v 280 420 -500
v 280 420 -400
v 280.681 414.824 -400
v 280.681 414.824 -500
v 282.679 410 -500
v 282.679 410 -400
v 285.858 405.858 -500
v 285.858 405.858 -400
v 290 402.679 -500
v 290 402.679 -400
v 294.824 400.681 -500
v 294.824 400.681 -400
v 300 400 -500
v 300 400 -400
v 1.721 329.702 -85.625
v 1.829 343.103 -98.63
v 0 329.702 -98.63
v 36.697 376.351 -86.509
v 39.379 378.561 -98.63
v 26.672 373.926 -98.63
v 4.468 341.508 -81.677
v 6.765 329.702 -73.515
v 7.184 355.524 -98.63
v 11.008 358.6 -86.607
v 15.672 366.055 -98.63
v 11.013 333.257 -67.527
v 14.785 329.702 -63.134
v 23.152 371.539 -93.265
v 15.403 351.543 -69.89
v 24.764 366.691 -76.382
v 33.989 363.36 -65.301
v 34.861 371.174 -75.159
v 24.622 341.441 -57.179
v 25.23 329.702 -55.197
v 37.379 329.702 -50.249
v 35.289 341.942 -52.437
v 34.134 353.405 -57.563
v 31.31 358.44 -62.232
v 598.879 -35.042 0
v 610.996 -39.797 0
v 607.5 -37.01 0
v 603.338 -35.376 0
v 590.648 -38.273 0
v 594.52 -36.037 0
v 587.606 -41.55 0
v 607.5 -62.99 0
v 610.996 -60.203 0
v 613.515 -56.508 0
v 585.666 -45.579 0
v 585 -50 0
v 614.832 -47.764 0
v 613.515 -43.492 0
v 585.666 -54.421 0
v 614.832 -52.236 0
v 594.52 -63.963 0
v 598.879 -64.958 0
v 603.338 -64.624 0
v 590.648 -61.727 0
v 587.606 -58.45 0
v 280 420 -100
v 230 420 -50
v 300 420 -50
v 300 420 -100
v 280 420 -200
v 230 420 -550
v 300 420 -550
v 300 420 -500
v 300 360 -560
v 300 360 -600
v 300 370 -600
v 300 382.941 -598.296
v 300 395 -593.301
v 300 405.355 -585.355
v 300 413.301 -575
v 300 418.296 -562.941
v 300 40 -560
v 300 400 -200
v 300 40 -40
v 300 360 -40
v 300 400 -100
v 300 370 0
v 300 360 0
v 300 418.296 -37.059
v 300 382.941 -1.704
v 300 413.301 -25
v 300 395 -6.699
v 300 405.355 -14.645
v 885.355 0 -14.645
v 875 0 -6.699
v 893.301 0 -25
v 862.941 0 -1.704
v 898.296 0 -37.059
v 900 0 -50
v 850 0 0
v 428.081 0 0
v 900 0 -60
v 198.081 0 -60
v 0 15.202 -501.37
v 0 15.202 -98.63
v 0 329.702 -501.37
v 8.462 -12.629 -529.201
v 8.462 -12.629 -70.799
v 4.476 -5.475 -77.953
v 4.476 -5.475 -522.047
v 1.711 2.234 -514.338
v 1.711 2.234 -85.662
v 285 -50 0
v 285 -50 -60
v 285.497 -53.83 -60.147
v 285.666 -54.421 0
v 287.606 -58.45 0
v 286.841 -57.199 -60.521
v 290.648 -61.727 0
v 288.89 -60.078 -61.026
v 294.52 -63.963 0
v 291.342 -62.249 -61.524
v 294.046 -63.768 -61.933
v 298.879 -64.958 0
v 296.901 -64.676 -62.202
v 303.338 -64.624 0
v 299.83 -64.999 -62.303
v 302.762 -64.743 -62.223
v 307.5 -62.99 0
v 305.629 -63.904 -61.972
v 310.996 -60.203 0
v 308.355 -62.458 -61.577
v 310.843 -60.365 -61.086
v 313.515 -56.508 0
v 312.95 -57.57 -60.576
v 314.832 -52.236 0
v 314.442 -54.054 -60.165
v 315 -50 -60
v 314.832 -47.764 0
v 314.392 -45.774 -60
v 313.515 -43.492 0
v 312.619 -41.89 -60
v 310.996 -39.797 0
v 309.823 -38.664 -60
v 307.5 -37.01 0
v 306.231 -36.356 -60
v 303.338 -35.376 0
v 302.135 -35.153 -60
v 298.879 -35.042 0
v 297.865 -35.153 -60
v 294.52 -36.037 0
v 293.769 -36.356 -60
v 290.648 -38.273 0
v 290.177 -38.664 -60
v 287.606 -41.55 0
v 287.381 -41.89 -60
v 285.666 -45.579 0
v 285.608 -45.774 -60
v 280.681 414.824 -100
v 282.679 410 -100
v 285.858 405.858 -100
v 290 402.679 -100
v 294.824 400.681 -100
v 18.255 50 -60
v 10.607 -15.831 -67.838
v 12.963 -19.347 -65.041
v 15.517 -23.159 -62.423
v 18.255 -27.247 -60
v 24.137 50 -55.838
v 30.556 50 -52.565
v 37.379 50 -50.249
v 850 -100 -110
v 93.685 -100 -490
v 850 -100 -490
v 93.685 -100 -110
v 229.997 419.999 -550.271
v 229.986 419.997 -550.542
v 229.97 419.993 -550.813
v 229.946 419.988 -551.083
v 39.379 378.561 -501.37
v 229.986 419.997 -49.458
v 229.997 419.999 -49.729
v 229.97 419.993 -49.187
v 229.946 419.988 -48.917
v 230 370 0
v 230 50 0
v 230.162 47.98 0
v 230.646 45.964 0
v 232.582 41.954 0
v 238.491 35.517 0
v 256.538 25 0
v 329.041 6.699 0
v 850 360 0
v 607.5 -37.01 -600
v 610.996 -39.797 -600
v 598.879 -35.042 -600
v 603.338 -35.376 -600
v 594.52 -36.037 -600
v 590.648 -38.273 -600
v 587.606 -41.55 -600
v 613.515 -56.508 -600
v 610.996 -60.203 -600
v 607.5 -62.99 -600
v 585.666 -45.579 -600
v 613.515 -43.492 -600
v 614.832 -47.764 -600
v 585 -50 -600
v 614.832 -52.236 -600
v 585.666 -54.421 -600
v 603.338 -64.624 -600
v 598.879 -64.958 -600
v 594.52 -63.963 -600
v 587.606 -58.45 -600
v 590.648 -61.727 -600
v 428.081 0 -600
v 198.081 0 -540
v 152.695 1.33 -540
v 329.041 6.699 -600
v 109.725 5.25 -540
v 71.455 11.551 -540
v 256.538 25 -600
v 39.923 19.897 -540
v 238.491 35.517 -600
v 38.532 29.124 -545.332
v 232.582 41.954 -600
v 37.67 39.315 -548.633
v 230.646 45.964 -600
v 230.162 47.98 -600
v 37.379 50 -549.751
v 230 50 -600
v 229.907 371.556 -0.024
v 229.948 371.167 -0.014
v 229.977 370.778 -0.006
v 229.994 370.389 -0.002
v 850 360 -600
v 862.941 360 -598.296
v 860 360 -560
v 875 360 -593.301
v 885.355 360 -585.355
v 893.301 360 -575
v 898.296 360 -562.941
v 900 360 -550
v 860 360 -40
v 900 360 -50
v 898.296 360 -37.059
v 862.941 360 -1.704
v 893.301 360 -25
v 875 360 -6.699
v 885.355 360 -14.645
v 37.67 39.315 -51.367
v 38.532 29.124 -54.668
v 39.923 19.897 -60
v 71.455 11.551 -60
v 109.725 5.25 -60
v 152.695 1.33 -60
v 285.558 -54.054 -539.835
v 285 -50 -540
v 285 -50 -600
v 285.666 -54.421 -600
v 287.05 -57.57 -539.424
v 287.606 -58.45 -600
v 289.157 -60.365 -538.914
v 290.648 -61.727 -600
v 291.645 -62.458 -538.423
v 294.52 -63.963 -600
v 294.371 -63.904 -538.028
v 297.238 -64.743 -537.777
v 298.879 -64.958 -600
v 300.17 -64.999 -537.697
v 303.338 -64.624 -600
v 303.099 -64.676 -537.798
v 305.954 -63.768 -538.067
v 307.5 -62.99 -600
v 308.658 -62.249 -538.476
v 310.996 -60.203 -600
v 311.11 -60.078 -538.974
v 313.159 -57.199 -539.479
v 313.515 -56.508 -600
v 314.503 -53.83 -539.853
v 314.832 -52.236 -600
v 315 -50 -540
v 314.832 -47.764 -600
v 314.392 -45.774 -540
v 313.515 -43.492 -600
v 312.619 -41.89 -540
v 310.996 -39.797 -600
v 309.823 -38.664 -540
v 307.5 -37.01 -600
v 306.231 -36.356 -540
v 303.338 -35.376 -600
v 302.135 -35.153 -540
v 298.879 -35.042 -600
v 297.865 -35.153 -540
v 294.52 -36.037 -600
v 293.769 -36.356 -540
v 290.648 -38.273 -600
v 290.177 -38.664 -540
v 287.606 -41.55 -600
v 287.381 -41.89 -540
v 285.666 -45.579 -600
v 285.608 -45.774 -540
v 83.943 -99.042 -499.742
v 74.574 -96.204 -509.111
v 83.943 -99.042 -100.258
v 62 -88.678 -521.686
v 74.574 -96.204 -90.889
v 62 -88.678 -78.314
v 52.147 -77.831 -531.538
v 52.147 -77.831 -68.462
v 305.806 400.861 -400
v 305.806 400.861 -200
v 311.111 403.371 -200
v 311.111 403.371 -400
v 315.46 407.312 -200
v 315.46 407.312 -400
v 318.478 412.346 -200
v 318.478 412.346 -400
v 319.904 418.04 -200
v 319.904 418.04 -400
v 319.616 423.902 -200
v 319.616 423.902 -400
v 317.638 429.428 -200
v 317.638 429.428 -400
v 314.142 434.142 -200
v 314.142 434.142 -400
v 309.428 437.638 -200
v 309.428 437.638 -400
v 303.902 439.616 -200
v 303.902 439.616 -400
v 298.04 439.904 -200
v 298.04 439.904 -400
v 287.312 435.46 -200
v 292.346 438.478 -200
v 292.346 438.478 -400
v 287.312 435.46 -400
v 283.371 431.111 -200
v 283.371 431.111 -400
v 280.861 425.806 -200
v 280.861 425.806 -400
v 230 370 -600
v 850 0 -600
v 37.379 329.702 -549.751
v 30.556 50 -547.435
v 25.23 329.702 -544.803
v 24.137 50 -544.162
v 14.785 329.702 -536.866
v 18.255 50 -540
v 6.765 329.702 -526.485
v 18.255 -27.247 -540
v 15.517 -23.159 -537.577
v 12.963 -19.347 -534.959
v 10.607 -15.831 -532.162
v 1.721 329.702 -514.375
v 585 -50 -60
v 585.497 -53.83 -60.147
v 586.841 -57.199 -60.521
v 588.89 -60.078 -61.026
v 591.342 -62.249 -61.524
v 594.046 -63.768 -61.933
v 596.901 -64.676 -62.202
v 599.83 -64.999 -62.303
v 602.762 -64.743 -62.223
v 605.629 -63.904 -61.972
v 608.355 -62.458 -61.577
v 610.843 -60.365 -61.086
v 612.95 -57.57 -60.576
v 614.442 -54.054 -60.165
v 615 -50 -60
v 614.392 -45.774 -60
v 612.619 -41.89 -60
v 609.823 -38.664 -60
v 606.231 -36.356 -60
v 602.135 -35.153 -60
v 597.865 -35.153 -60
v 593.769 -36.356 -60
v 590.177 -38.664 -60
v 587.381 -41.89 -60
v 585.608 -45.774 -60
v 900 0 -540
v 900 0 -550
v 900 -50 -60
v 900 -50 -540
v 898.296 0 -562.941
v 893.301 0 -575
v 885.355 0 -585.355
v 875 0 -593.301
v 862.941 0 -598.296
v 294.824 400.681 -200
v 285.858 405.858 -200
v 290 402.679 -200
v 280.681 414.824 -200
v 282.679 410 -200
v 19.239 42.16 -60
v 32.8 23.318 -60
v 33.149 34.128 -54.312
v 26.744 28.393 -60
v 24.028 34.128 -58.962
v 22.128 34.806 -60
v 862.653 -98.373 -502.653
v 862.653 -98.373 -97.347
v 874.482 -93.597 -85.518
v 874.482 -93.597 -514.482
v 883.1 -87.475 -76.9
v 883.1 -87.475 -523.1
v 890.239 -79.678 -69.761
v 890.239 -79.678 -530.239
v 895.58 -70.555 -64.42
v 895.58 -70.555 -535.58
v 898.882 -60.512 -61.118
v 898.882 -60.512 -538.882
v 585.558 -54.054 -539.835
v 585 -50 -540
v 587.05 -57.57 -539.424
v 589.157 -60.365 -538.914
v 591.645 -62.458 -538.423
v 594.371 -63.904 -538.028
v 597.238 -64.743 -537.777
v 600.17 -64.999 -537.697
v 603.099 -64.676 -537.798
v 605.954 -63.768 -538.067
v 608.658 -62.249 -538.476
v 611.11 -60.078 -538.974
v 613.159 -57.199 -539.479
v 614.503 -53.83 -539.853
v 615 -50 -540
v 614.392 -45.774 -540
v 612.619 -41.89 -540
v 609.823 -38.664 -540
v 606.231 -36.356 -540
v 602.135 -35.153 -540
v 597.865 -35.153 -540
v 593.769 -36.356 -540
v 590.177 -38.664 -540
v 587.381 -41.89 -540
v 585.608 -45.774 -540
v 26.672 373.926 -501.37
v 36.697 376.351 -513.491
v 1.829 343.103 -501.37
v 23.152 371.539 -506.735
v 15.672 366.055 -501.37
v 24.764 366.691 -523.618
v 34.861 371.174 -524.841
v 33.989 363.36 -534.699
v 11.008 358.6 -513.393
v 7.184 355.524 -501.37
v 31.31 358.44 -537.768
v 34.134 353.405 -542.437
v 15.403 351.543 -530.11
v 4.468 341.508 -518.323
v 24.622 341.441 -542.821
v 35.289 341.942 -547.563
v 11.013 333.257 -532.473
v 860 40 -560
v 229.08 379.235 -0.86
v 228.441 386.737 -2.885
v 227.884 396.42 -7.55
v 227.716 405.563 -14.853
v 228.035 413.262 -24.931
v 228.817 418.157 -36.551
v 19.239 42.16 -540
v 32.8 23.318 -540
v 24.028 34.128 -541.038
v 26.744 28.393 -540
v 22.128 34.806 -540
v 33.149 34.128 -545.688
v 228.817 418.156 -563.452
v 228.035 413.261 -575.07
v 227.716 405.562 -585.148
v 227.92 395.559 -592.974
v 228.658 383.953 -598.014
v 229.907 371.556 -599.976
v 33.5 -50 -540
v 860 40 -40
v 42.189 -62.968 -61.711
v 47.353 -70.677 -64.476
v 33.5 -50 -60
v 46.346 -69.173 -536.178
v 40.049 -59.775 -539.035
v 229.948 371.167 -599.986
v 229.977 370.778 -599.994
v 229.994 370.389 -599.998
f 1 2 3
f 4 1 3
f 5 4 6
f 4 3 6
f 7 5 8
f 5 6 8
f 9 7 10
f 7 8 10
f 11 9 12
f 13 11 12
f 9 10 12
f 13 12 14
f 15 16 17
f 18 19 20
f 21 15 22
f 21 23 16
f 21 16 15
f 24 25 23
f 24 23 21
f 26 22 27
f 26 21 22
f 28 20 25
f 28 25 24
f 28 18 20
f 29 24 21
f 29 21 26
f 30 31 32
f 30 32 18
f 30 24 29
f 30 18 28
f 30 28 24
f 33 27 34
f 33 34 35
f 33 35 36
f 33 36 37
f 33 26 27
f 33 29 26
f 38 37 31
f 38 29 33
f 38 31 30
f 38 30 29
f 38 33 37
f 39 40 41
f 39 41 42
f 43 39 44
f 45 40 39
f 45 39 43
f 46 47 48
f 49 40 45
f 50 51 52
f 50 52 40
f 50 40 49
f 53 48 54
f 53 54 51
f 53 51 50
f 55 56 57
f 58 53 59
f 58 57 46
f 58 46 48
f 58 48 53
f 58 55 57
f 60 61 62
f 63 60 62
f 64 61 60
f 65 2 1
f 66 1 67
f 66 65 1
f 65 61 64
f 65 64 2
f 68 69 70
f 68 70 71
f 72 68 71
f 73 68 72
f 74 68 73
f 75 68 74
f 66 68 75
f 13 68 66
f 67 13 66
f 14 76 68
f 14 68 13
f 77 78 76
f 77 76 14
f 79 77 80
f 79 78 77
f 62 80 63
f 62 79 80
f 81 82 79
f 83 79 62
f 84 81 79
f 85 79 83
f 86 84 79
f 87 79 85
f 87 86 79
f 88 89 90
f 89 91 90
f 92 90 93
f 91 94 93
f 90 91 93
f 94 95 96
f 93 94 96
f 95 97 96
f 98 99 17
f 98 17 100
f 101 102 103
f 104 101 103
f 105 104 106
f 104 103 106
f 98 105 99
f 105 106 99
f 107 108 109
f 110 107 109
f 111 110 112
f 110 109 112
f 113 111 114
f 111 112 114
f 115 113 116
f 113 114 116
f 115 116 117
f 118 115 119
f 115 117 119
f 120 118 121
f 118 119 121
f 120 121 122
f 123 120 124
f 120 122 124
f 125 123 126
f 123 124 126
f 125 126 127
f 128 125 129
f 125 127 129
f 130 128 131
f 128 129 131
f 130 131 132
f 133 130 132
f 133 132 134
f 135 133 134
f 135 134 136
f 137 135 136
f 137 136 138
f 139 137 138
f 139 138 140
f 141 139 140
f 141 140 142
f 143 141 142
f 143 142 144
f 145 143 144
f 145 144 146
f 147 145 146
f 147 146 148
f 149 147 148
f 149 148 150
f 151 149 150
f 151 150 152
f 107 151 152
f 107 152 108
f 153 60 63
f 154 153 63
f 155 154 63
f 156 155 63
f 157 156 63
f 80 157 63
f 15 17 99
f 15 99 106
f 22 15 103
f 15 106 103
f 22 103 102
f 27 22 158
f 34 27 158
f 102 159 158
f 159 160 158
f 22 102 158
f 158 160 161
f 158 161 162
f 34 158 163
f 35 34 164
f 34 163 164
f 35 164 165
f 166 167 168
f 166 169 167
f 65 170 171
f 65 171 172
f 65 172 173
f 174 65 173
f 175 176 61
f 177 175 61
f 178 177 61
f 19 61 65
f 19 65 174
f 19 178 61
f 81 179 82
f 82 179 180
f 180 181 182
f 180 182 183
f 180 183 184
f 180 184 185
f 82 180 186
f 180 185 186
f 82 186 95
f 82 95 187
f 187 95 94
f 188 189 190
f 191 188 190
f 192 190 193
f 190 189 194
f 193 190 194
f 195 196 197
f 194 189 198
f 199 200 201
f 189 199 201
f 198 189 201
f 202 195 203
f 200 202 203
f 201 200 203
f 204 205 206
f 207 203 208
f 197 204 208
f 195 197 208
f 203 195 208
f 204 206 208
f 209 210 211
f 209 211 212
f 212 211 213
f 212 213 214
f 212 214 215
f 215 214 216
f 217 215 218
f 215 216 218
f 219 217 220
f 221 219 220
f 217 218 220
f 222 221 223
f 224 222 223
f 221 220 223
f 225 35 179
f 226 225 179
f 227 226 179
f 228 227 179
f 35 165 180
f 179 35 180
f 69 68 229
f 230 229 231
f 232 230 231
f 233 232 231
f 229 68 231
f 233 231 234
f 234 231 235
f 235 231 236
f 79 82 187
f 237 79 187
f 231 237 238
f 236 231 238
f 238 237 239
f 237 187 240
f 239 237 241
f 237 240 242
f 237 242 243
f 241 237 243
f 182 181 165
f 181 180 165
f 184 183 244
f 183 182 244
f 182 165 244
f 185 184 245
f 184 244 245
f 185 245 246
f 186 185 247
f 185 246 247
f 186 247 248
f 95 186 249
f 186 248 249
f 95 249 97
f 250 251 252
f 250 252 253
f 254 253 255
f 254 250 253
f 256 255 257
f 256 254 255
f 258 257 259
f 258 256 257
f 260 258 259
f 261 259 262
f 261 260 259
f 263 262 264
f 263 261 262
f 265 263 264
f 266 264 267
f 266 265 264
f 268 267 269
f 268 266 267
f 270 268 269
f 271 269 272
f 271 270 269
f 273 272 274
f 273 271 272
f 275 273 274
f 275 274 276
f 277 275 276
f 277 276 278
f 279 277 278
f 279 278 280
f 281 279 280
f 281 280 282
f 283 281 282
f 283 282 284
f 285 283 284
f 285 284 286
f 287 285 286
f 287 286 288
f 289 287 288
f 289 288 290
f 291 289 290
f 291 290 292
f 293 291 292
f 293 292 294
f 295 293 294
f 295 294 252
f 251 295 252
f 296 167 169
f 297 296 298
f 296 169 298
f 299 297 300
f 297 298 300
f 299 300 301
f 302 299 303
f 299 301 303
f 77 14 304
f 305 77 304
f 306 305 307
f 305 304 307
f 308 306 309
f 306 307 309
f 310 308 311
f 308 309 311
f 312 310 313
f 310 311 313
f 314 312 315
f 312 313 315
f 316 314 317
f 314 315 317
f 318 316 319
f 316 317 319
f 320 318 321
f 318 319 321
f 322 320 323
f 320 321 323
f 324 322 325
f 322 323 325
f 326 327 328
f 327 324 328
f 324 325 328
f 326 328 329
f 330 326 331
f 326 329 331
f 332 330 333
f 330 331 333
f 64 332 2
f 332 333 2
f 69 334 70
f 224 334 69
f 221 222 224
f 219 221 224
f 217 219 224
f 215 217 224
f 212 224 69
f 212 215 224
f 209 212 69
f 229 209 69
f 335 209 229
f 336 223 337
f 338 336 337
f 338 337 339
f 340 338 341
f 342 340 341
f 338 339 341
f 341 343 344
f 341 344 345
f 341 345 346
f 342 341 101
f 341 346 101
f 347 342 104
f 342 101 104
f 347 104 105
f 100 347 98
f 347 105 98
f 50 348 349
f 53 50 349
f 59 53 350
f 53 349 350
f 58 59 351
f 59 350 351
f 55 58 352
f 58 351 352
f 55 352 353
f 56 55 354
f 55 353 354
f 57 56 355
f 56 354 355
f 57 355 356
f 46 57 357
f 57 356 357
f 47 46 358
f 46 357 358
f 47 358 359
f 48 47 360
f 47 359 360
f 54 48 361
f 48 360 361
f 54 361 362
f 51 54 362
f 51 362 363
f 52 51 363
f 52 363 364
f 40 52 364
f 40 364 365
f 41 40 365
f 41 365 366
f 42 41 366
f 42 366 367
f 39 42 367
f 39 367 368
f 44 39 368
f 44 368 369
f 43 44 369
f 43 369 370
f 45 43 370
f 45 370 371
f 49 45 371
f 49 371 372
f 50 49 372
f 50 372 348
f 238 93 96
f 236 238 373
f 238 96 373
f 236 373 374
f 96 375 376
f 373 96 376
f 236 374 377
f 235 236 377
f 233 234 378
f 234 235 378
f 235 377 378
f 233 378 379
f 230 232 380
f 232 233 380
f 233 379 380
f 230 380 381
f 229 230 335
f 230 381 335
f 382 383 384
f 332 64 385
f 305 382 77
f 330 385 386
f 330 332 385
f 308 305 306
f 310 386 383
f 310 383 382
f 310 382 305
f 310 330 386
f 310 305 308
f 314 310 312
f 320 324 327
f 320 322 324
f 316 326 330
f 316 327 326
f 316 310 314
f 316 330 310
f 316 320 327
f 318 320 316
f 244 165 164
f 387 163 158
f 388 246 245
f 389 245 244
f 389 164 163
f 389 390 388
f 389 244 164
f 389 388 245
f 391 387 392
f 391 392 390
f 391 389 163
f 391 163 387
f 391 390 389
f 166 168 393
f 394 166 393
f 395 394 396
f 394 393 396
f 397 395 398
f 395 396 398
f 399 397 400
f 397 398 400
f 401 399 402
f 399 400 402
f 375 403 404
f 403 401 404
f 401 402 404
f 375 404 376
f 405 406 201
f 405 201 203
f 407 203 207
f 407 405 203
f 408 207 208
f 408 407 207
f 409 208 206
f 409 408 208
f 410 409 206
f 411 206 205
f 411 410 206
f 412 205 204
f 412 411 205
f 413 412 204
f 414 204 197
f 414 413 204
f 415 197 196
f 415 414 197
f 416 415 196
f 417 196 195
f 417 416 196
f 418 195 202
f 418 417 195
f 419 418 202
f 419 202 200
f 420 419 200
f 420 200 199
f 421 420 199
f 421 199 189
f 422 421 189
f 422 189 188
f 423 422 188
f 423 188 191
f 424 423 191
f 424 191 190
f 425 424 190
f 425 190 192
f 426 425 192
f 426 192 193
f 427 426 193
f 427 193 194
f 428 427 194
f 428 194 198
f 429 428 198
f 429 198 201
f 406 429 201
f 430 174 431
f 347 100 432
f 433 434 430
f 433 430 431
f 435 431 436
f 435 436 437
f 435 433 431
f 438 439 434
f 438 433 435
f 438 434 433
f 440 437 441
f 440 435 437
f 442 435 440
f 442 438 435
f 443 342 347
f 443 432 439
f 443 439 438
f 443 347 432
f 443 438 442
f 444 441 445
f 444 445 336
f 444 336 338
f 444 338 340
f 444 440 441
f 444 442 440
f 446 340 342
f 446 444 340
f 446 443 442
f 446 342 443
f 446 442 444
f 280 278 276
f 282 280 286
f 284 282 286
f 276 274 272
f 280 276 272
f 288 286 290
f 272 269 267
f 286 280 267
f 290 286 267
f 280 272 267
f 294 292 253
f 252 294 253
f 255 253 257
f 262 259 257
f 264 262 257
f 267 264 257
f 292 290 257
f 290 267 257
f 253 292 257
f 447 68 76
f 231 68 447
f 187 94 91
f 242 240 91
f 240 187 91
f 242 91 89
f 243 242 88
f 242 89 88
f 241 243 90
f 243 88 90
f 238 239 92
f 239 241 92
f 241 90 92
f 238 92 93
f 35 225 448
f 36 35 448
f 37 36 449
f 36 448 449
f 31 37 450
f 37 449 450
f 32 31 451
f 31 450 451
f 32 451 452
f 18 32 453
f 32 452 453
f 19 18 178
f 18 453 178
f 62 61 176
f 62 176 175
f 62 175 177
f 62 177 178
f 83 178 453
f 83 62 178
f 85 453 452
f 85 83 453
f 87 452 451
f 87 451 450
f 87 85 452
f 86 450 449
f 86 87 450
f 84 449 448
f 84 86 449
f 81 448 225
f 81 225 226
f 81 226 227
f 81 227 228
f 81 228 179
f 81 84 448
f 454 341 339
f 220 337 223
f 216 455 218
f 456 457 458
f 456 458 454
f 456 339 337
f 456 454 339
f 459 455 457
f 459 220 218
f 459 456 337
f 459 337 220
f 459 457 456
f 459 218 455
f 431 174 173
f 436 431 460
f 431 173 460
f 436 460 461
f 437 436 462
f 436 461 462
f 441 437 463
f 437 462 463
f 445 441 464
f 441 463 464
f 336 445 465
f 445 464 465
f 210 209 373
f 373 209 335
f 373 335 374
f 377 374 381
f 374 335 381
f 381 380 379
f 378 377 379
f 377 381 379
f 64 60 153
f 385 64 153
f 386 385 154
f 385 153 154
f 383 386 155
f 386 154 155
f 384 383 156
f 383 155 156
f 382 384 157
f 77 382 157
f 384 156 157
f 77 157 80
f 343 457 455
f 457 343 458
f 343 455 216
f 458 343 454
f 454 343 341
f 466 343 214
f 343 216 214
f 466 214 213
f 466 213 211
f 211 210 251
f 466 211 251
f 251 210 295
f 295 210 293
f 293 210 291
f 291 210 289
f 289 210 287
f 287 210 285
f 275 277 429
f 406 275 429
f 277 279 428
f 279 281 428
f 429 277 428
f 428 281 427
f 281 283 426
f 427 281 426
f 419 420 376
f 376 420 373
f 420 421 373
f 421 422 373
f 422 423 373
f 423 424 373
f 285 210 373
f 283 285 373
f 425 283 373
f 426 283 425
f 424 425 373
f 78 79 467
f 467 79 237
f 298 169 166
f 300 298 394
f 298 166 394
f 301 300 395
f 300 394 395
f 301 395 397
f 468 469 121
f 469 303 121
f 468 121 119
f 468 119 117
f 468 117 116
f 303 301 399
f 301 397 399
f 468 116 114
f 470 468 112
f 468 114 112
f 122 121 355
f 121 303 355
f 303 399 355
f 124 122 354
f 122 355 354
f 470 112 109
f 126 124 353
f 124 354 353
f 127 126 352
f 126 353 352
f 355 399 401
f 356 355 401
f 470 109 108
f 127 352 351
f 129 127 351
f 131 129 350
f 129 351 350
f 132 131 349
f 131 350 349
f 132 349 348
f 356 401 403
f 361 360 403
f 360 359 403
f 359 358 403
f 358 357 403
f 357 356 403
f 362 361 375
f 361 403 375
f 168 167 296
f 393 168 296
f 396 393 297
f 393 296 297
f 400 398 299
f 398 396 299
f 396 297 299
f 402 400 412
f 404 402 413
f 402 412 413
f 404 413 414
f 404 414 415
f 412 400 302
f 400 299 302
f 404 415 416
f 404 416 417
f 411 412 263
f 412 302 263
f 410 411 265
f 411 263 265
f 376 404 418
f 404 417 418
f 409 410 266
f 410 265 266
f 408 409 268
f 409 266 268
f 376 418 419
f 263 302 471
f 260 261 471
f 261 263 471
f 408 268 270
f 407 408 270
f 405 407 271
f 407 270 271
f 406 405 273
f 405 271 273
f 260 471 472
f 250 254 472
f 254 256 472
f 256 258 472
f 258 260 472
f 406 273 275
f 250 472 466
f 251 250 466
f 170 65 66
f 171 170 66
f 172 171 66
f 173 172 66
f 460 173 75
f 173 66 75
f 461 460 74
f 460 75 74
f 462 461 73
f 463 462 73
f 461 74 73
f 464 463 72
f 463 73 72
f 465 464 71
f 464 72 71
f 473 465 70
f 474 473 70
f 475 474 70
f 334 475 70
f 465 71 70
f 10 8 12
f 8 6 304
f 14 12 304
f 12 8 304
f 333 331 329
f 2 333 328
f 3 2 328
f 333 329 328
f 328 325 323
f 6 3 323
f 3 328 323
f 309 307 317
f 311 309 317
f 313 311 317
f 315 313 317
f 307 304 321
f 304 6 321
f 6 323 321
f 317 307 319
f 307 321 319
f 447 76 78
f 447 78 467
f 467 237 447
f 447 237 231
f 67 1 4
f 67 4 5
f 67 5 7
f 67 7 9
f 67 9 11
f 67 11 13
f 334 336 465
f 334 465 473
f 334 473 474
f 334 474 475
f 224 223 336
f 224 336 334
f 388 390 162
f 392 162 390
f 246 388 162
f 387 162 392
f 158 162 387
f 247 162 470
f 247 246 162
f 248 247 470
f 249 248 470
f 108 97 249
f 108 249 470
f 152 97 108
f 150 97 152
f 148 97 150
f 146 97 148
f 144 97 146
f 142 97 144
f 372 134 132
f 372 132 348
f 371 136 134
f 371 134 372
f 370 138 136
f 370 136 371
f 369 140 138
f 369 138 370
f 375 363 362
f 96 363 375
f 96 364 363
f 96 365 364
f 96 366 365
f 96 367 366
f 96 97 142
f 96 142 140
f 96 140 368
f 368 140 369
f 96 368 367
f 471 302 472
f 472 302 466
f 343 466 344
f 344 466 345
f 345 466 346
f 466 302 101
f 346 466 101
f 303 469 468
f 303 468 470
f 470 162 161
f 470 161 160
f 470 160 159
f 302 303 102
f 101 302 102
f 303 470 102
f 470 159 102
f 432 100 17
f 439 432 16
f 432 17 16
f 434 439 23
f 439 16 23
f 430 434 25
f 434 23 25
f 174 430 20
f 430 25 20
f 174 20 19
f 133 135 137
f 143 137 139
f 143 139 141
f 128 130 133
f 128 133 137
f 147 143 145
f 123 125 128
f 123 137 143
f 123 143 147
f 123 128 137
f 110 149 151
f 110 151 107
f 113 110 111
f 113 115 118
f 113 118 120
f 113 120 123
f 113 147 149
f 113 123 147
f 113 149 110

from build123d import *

# Parameters (mm, degrees)
SKETCH1_W                = 900
SKETCH1_H                = 600
BOSS_EXTRUDE1_DEPTH      = 420
SKETCH2_W                = 900
SKETCH2_H                = 480
BOSS_EXTRUDE2_DEPTH      = 100
SKETCH3_W                = 600
SKETCH3_H                = 60
CUT_EXTRUDE1_DEPTH       = 1161.344776349
SKETCH4_W                = 560
SKETCH4_H                = 520
CUT_EXTRUDE2_DEPTH       = 320
CUT_EXTRUDE3_REACH       = 1162.345
CUT_EXTRUDE4_DEPTH       = 1161.344776349
CUT_EXTRUDE6_DEPTH       = 1131.486620885
SKETCH9_R                = 15
BOSS_EXTRUDE3_DEPTH      = 60
BOSS_EXTRUDE4_DEPTH      = 100
BOSS_EXTRUDE4_DEPTH_BACK = 100
SKETCH10_R               = 20
CUT_EXTRUDE7_START       = -100
SKETCH10_2_R             = 20
CUT_EXTRUDE7_DEPTH       = 100
CUT_EXTRUDE8_START       = 200
SKETCH10_3_R             = 20
CUT_EXTRUDE8_DEPTH       = 100
FILLET1_R                = 50
FILLET2_R                = 50
FILLET3_R                = 50


with BuildPart() as part:
    # Sketch1 → Boss-Extrude1 (new body)
    with BuildSketch(Plane(origin=(0, 0, 0), x_dir=(1, 0, 0), z_dir=(0, 1, 0))):
        with Locations((450, 300)):
            Rectangle(SKETCH1_W, SKETCH1_H)
    extrude(amount=BOSS_EXTRUDE1_DEPTH)

    # Sketch2 → Boss-Extrude2 (add)
    with BuildSketch(Plane.XZ):
        with Locations((450, -300)):
            Rectangle(SKETCH2_W, SKETCH2_H)
    extrude(amount=BOSS_EXTRUDE2_DEPTH)

    # Sketch3 → Cut-Extrude1 (cut, through all)
    with BuildSketch(Plane.XY):
        with Locations((600, 390)):
            Rectangle(SKETCH3_W, SKETCH3_H)
    extrude(amount=-CUT_EXTRUDE1_DEPTH, mode=Mode.SUBTRACT)

    # Sketch4 → Cut-Extrude2 (cut)
    with BuildSketch(Plane(origin=(0, 360, 0), x_dir=(1, 0, 0), z_dir=(0, 1, 0))):
        with Locations((580, 300)):
            Rectangle(SKETCH4_W, SKETCH4_H)
    extrude(amount=-CUT_EXTRUDE2_DEPTH, mode=Mode.SUBTRACT)

    # Sketch5 → Cut-Extrude3 (cut, up to next)
    with BuildSketch(Plane.XY, mode=Mode.PRIVATE) as cut_extrude3_sk1:
        Polygon((230, 420), (0, 370), (0, 420), align=None)
    cut_extrude3_tool1 = extrude(cut_extrude3_sk1.sketch, amount=-CUT_EXTRUDE3_REACH, mode=Mode.PRIVATE) & part.part
    add(cut_extrude3_tool1.solids().sort_by_distance((76.666667, 403.333333, 0))[0], mode=Mode.SUBTRACT)

    # Sketch6 → Cut-Extrude4 (cut, through all)
    with BuildSketch(Plane.XZ):
        Polygon((0, -60), (230, 0), (0, 0), align=None)
        Polygon((230, -600), (0, -600), (0, -540), align=None)
    extrude(amount=-CUT_EXTRUDE4_DEPTH, mode=Mode.SUBTRACT)

    # Sketch8 → Cut-Extrude6 (cut, through all)
    with BuildSketch(Plane.XY.offset(-60)):
        Polygon((0, 0), (0, -100), (67, -100), align=None)
    extrude(amount=-CUT_EXTRUDE6_DEPTH, mode=Mode.SUBTRACT)

    # Sketch9 → Boss-Extrude3 (add)
    with BuildSketch(Plane.XY.offset(-60)):
        with Locations(Location((300, -50, 0), (0, 0, 180))):
            Circle(SKETCH9_R)
        with Locations(Location((600, -50, 0), (0, 0, 180))):
            Circle(SKETCH9_R)
    boss_extrude3 = extrude(amount=BOSS_EXTRUDE3_DEPTH)

    # Mirror1: Boss-Extrude3 across plane
    add(boss_extrude3.mirror(Plane.XY.offset(-300)))

    # Sketch10 → Boss-Extrude4 (add, two sides: drawn at the far end of the back side and taken through both)
    with BuildSketch(Plane.XY.offset(-300).offset(-BOSS_EXTRUDE4_DEPTH_BACK)):
        with Locations((300, 420)):
            Circle(SKETCH10_R)
    extrude(amount=BOSS_EXTRUDE4_DEPTH + BOSS_EXTRUDE4_DEPTH_BACK)

    # Sketch10<2> → Cut-Extrude7 (cut)
    with BuildSketch(Plane.XY.offset(-300).offset(CUT_EXTRUDE7_START)):
        with Locations((300, 420)):
            Circle(SKETCH10_2_R)
    extrude(amount=-CUT_EXTRUDE7_DEPTH, mode=Mode.SUBTRACT)

    # Sketch10<3> → Cut-Extrude8 (cut)
    with BuildSketch(Plane.XY.offset(-300).offset(CUT_EXTRUDE8_START)):
        with Locations((300, 420)):
            Circle(SKETCH10_3_R)
    extrude(amount=-CUT_EXTRUDE8_DEPTH, mode=Mode.SUBTRACT)

    # Fillet1
    # the kernel refuses this fillet: 50 mm, written as the material it takes off along each edge
    with BuildSketch(Plane(origin=(50, 329.701729148, -98.629844887), x_dir=(0.6192801017568266, 0.7683705636310696, 0.1615513308930852), z_dir=(-0.7290664199156293, 0.48634721888098287, 0.4815895950268663))) as fillet1_piece_1_section:
        Polygon((-89.929696939, -89.929696939), (89.929696939, -89.929696939), (89.929696939, 89.929696939), (-89.929696939, 89.929696939), align=None)
    fillet1_piece_1 = extrude(amount=89.929696939, mode=Mode.PRIVATE)
    fillet1_piece_1 = split(fillet1_piece_1, bisect_by=Plane(origin=(50, 329.701729148, -98.629844887), z_dir=(0, 1, 0)), keep=Keep.TOP, mode=Mode.PRIVATE)
    fillet1_piece_1 = split(fillet1_piece_1, bisect_by=Plane(origin=(50, 329.701729148, -98.629844887), z_dir=(0, 0, 1)), keep=Keep.TOP, mode=Mode.PRIVATE)
    fillet1_piece_1 = split(fillet1_piece_1, bisect_by=Plane(origin=(50, 329.701729148, -98.629844887), z_dir=(-0.9468950150315111, -0.20584674239815454, -0.24701609087778548)), keep=Keep.TOP, mode=Mode.PRIVATE)
    fillet1_piece_1 = split(fillet1_piece_1, bisect_by=Plane(origin=(37.378905143, 329.701729148, -50.248981267), z_dir=(0.25242189714700275, 0, -0.9676172723968439)), keep=Keep.TOP, mode=Mode.PRIVATE)
    fillet1_piece_1 = split(fillet1_piece_1, bisect_by=Plane(origin=(0, 329.701729148, -98.629844887), z_dir=(1, 0, 0)), keep=Keep.TOP, mode=Mode.PRIVATE)
    fillet1_piece_1 = split(fillet1_piece_1, bisect_by=Plane(origin=(39.378517783, 378.560547344, -98.629844887), z_dir=(0.21242964433104364, -0.9771763639228009, 0)), keep=Keep.TOP, mode=Mode.PRIVATE)
    fillet1_piece_1 = fillet1_piece_1 - Plane(origin=(50, 329.701729148, -98.629844887), x_dir=(0.7290664199156293, -0.48634721888098287, -0.4815895950268663), z_dir=(0.6192801017568266, 0.7683705636310696, 0.1615513308930852)) * Sphere(FILLET1_R, mode=Mode.PRIVATE)
    add(fillet1_piece_1, mode=Mode.SUBTRACT)
    with BuildSketch(Plane(origin=(50, 329.701729148, -501.370155113), x_dir=(-0.6192801017568265, -0.7683705636310695, 0.16155133089308576), z_dir=(-0.7290664199156294, 0.48634721888098265, -0.481589595026866))) as fillet1_piece_2_section:
        Polygon((-89.929696939, -89.929696939), (89.929696939, -89.929696939), (89.929696939, 89.929696939), (-89.929696939, 89.929696939), align=None)
    fillet1_piece_2 = extrude(amount=89.929696939, mode=Mode.PRIVATE)
    fillet1_piece_2 = split(fillet1_piece_2, bisect_by=Plane(origin=(50, 329.701729148, -501.370155113), z_dir=(0, 1, 0)), keep=Keep.TOP, mode=Mode.PRIVATE)
    fillet1_piece_2 = split(fillet1_piece_2, bisect_by=Plane(origin=(50, 329.701729148, -501.370155113), z_dir=(0, 0, -1)), keep=Keep.TOP, mode=Mode.PRIVATE)
    fillet1_piece_2 = split(fillet1_piece_2, bisect_by=Plane(origin=(50, 329.701729148, -501.370155113), z_dir=(-0.9468950150315109, -0.20584674239815448, 0.24701609087778634)), keep=Keep.TOP, mode=Mode.PRIVATE)
    fillet1_piece_2 = split(fillet1_piece_2, bisect_by=Plane(origin=(37.378905143, 329.701729148, -549.751018733), z_dir=(0.25242189714700364, 0, 0.9676172723968437)), keep=Keep.TOP, mode=Mode.PRIVATE)
    fillet1_piece_2 = split(fillet1_piece_2, bisect_by=Plane(origin=(0, 329.701729148, -501.370155113), z_dir=(1, 0, 0)), keep=Keep.TOP, mode=Mode.PRIVATE)
    fillet1_piece_2 = split(fillet1_piece_2, bisect_by=Plane(origin=(39.378517783, 378.560547344, -501.370155113), z_dir=(0.21242964433104364, -0.9771763639228009, 0)), keep=Keep.TOP, mode=Mode.PRIVATE)
    fillet1_piece_2 = fillet1_piece_2 - Plane(origin=(50, 329.701729148, -501.370155113), x_dir=(0.7290664199156294, -0.48634721888098265, 0.481589595026866), z_dir=(-0.6192801017568265, -0.7683705636310695, 0.16155133089308576)) * Sphere(FILLET1_R, mode=Mode.PRIVATE)
    add(fillet1_piece_2, mode=Mode.SUBTRACT)
    with BuildSketch(Plane(origin=(0, 0, -21.995779649), x_dir=(0, 1, 0), z_dir=(0, 0, -1))) as fillet1_piece_3:
        with BuildLine():
            CenterArc((FILLET1_R * 0.304033762809, FILLET1_R), FILLET1_R, 236.177914783, 33.822085217)
            Line((-FILLET1_R * 0.252582122431, FILLET1_R * 0.169230022029), (0, 0))
            Line((0, 0), (FILLET1_R * 0.304033762809, 0))
        make_face()
    extrude(amount=556.008440702, mode=Mode.SUBTRACT)
    with BuildSketch(Plane(origin=(900, -100, -665), x_dir=(-1, 0, 0), z_dir=(0, 0, 1))) as fillet1_piece_4:
        with BuildLine():
            CenterArc((FILLET1_R, -FILLET1_R), FILLET1_R, 90, 90)
            Line((0, -FILLET1_R), (0, 0))
            Line((0, 0), (FILLET1_R, 0))
        make_face()
    extrude(amount=730, mode=Mode.SUBTRACT)
    with BuildSketch(Plane(origin=(1025, -100, -60), x_dir=(0, 0, -1), z_dir=(-1, 0, 0))) as fillet1_piece_5_section:
        with BuildLine():
            CenterArc((FILLET1_R, -FILLET1_R), FILLET1_R, 90, 90)
            Line((0, -FILLET1_R), (0, 0))
            Line((0, 0), (FILLET1_R, 0))
        make_face()
    fillet1_piece_5 = extrude(amount=1083, mode=Mode.PRIVATE)
    fillet1_piece_5 = fillet1_piece_5 - Plane(origin=(600, -50, -60), x_dir=(-1, 0, 0), z_dir=(0, 0, -1)) * Cylinder(15, 2366, mode=Mode.PRIVATE)
    fillet1_piece_5 = fillet1_piece_5 - Plane(origin=(300, -50, -60), x_dir=(-1, 0, 0), z_dir=(0, 0, -1)) * Cylinder(15, 2366, mode=Mode.PRIVATE)
    add(fillet1_piece_5, mode=Mode.SUBTRACT)
    with BuildSketch(Plane(origin=(900, -125, -600), x_dir=(-1, 0, 0), z_dir=(0, 1, 0))) as fillet1_piece_6:
        with BuildLine():
            CenterArc((FILLET1_R, FILLET1_R), FILLET1_R, 180, 90)
            Line((0, FILLET1_R), (0, 0))
            Line((0, 0), (FILLET1_R, 0))
        make_face()
    extrude(amount=610, mode=Mode.SUBTRACT)
    with BuildSketch(Plane(origin=(900, -125, 0), x_dir=(-1, 0, 0), z_dir=(0, 1, 0))) as fillet1_piece_7:
        with BuildLine():
            CenterArc((FILLET1_R, -FILLET1_R), FILLET1_R, 90, 90)
            Line((0, -FILLET1_R), (0, 0))
            Line((0, 0), (FILLET1_R, 0))
        make_face()
    extrude(amount=610, mode=Mode.SUBTRACT)
    with BuildSketch(Plane(origin=(0, 370, -98.629844887), x_dir=(0, -1, 0), z_dir=(0, 0, -1))) as fillet1_piece_8:
        with BuildLine():
            CenterArc((FILLET1_R * 0.805965417038, -FILLET1_R), FILLET1_R, 90, 77.735226272)
            Line((-FILLET1_R * 0.171210946885, -FILLET1_R * 0.787570355669), (0, 0))
            Line((0, 0), (FILLET1_R * 0.805965417038, 0))
        make_face()
    extrude(amount=402.740310226, mode=Mode.SUBTRACT)
    with BuildSketch(Plane(origin=(566.529427721, 493.158571244, -687.790285493), x_dir=(0.19918086341107819, -0.9785842419761663, -0.05196022523767174), z_dir=(-0.9468950150315109, -0.20584674239815448, 0.24701609087778634))) as fillet1_piece_9:
        with BuildLine():
            CenterArc((FILLET1_R * 0.947741611278, FILLET1_R), FILLET1_R, 183.073782419, 86.926217581)
            Line((-FILLET1_R * 0.0508197000604, FILLET1_R * 0.946378106168), (0, 0))
            Line((0, 0), (FILLET1_R * 0.947741611278, 0))
        make_face()
    extrude(amount=568.794970562, mode=Mode.SUBTRACT)
    with BuildSketch(Plane(origin=(566.529427721, 493.158571244, 87.790285493), x_dir=(0.19918086341107794, -0.9785842419761663, 0.05196022523767291), z_dir=(-0.9468950150315111, -0.20584674239815454, -0.24701609087778548))) as fillet1_piece_10:
        with BuildLine():
            CenterArc((FILLET1_R * 0.947741611278, -FILLET1_R), FILLET1_R, 90, 86.926217581)
            Line((-FILLET1_R * 0.0508197000604, -FILLET1_R * 0.946378106168), (0, 0))
            Line((0, 0), (FILLET1_R * 0.947741611278, 0))
        make_face()
    extrude(amount=568.794970562, mode=Mode.SUBTRACT)
    with BuildSketch(Plane(origin=(0, -96.574612217, -60), x_dir=(0.9676172723968437, 0, 0.25242189714700275), z_dir=(0, 1, 0)), Plane(origin=(0, -96.574612217, -540), x_dir=(0, 0, 1), z_dir=(0, 1, 0))) as fillet1_piece_11:
        with BuildLine():
            CenterArc((FILLET1_R * 0.77259689774, FILLET1_R), FILLET1_R, 194.620873989, 75.379126011)
            Line((-FILLET1_R * 0.195020374657, FILLET1_R * 0.747578102853), (0, 0))
            Line((0, 0), (FILLET1_R * 0.77259689774, 0))
        make_face()
    extrude(amount=426.276341366, mode=Mode.SUBTRACT)
    with BuildSketch(Plane(origin=(-58, -100, -540), x_dir=(0, 1, 0), z_dir=(1, 0, 0))) as fillet1_piece_12_section:
        with BuildLine():
            CenterArc((FILLET1_R, FILLET1_R), FILLET1_R, 180, 90)
            Line((0, FILLET1_R), (0, 0))
            Line((0, 0), (FILLET1_R, 0))
        make_face()
    fillet1_piece_12 = extrude(amount=1083, mode=Mode.PRIVATE)
    fillet1_piece_12 = fillet1_piece_12 - Plane(origin=(300, -50, -540), x_dir=(-1, 0, 0), z_dir=(0, 0, 1)) * Cylinder(15, 2366, mode=Mode.PRIVATE)
    fillet1_piece_12 = fillet1_piece_12 - Plane(origin=(600, -50, -540), x_dir=(-1, 0, 0), z_dir=(0, 0, 1)) * Cylinder(15, 2366, mode=Mode.PRIVATE)
    add(fillet1_piece_12, mode=Mode.SUBTRACT)
    with BuildSketch(Plane(origin=(67, -100, 6.712827635), x_dir=(1, 0, 0), z_dir=(0, 0, -1))) as fillet1_piece_13:
        with BuildLine():
            CenterArc((FILLET1_R * 0.533702621082, -FILLET1_R), FILLET1_R, 90, 56.177914783)
            Line((-FILLET1_R * 0.297067356889, -FILLET1_R * 0.443384114759), (0, 0))
            Line((0, 0), (FILLET1_R * 0.533702621082, 0))
        make_face()
    extrude(amount=613.425655271, mode=Mode.SUBTRACT)

    # Fillet2
    # the kernel refuses this fillet: 50 mm, written as the material it takes off along each edge
    with BuildSketch(Plane(origin=(37.378905143, 0, -50.248981267), x_dir=(0.25242189714700275, 0, -0.9676172723968439), z_dir=(0.9676172723968439, 0, 0.25242189714700275))) as fillet2_piece_1_section:
        with BuildLine():
            CenterArc((FILLET2_R, FILLET2_R), FILLET2_R, 180, 90)
            Line((0, FILLET2_R), (0, 0))
            Line((0, 0), (FILLET2_R, 0))
        make_face()
    fillet2_piece_1 = extrude(amount=411.567441593, mode=Mode.PRIVATE)
    fillet2_piece_1 = split(fillet2_piece_1, bisect_by=Plane(origin=(37.378905143, 0, -60), z_dir=(0, 0, 1)), keep=Keep.TOP, mode=Mode.PRIVATE)
    add(fillet2_piece_1, mode=Mode.SUBTRACT)
    with BuildSketch(Plane(origin=(50, 0, -98.629844887), x_dir=(-0.25242189714696206, 0, 0.9676172723968545), z_dir=(0.9676172723968545, 0, 0.25242189714696206))) as fillet2_piece_2_section:
        with BuildLine():
            CenterArc((50 - FILLET2_R, -FILLET2_R), FILLET2_R, 0, 90)
            Line((50, -FILLET2_R), (50, 0))
            Line((50, 0), (50 - FILLET2_R, 0))
        make_face()
    fillet2_piece_2 = revolve(axis=Axis((50, 0, -98.629844887), (0, -1, 0)), revolution_arc=168.035275563, mode=Mode.PRIVATE)
    fillet2_piece_2 = split(fillet2_piece_2, bisect_by=Plane(origin=(50, 0, -60), z_dir=(0, 0, 1)), keep=Keep.TOP, mode=Mode.PRIVATE)
    add(fillet2_piece_2, mode=Mode.SUBTRACT)
    with BuildSketch(Plane(origin=(50, 0, -501.370155113), x_dir=(0.04634195190400165, 0, 0.998925634616375), z_dir=(0.998925634616375, 0, -0.04634195190400165))) as fillet2_piece_3_section:
        with BuildLine():
            CenterArc((50 - FILLET2_R, -FILLET2_R), FILLET2_R, 0, 90)
            Line((50, -FILLET2_R), (50, 0))
            Line((50, 0), (50 - FILLET2_R, 0))
        make_face()
    fillet2_piece_3 = revolve(axis=Axis((50, 0, -501.370155113), (0, -1, 0)), revolution_arc=168.035275563, mode=Mode.PRIVATE)
    fillet2_piece_3 = split(fillet2_piece_3, bisect_by=Plane(origin=(50, 0, -540), z_dir=(0, 0, -1)), keep=Keep.TOP, mode=Mode.PRIVATE)
    add(fillet2_piece_3, mode=Mode.SUBTRACT)
    with BuildSketch(Plane(origin=(37.378905143, 0, -549.751018733), x_dir=(0.25242189714700364, 0, 0.9676172723968436), z_dir=(0.9676172723968437, 0, -0.25242189714700364))) as fillet2_piece_4_section:
        with BuildLine():
            CenterArc((FILLET2_R, -FILLET2_R), FILLET2_R, 90, 90)
            Line((0, -FILLET2_R), (0, 0))
            Line((0, 0), (FILLET2_R, 0))
        make_face()
    fillet2_piece_4 = extrude(amount=411.567441593, mode=Mode.PRIVATE)
    fillet2_piece_4 = split(fillet2_piece_4, bisect_by=Plane(origin=(37.378905143, 0, -540), z_dir=(0, 0, -1)), keep=Keep.TOP, mode=Mode.PRIVATE)
    add(fillet2_piece_4, mode=Mode.SUBTRACT)

    # Fillet3
    fillet3_edges = [part.edges().sort_by_distance(p)[0] for p in [
        (294.537469961, 420, -600),
        (294.537469961, 420, 0),
    ]]
    fillet(fillet3_edges, radius=FILLET3_R)


solid = part.part
